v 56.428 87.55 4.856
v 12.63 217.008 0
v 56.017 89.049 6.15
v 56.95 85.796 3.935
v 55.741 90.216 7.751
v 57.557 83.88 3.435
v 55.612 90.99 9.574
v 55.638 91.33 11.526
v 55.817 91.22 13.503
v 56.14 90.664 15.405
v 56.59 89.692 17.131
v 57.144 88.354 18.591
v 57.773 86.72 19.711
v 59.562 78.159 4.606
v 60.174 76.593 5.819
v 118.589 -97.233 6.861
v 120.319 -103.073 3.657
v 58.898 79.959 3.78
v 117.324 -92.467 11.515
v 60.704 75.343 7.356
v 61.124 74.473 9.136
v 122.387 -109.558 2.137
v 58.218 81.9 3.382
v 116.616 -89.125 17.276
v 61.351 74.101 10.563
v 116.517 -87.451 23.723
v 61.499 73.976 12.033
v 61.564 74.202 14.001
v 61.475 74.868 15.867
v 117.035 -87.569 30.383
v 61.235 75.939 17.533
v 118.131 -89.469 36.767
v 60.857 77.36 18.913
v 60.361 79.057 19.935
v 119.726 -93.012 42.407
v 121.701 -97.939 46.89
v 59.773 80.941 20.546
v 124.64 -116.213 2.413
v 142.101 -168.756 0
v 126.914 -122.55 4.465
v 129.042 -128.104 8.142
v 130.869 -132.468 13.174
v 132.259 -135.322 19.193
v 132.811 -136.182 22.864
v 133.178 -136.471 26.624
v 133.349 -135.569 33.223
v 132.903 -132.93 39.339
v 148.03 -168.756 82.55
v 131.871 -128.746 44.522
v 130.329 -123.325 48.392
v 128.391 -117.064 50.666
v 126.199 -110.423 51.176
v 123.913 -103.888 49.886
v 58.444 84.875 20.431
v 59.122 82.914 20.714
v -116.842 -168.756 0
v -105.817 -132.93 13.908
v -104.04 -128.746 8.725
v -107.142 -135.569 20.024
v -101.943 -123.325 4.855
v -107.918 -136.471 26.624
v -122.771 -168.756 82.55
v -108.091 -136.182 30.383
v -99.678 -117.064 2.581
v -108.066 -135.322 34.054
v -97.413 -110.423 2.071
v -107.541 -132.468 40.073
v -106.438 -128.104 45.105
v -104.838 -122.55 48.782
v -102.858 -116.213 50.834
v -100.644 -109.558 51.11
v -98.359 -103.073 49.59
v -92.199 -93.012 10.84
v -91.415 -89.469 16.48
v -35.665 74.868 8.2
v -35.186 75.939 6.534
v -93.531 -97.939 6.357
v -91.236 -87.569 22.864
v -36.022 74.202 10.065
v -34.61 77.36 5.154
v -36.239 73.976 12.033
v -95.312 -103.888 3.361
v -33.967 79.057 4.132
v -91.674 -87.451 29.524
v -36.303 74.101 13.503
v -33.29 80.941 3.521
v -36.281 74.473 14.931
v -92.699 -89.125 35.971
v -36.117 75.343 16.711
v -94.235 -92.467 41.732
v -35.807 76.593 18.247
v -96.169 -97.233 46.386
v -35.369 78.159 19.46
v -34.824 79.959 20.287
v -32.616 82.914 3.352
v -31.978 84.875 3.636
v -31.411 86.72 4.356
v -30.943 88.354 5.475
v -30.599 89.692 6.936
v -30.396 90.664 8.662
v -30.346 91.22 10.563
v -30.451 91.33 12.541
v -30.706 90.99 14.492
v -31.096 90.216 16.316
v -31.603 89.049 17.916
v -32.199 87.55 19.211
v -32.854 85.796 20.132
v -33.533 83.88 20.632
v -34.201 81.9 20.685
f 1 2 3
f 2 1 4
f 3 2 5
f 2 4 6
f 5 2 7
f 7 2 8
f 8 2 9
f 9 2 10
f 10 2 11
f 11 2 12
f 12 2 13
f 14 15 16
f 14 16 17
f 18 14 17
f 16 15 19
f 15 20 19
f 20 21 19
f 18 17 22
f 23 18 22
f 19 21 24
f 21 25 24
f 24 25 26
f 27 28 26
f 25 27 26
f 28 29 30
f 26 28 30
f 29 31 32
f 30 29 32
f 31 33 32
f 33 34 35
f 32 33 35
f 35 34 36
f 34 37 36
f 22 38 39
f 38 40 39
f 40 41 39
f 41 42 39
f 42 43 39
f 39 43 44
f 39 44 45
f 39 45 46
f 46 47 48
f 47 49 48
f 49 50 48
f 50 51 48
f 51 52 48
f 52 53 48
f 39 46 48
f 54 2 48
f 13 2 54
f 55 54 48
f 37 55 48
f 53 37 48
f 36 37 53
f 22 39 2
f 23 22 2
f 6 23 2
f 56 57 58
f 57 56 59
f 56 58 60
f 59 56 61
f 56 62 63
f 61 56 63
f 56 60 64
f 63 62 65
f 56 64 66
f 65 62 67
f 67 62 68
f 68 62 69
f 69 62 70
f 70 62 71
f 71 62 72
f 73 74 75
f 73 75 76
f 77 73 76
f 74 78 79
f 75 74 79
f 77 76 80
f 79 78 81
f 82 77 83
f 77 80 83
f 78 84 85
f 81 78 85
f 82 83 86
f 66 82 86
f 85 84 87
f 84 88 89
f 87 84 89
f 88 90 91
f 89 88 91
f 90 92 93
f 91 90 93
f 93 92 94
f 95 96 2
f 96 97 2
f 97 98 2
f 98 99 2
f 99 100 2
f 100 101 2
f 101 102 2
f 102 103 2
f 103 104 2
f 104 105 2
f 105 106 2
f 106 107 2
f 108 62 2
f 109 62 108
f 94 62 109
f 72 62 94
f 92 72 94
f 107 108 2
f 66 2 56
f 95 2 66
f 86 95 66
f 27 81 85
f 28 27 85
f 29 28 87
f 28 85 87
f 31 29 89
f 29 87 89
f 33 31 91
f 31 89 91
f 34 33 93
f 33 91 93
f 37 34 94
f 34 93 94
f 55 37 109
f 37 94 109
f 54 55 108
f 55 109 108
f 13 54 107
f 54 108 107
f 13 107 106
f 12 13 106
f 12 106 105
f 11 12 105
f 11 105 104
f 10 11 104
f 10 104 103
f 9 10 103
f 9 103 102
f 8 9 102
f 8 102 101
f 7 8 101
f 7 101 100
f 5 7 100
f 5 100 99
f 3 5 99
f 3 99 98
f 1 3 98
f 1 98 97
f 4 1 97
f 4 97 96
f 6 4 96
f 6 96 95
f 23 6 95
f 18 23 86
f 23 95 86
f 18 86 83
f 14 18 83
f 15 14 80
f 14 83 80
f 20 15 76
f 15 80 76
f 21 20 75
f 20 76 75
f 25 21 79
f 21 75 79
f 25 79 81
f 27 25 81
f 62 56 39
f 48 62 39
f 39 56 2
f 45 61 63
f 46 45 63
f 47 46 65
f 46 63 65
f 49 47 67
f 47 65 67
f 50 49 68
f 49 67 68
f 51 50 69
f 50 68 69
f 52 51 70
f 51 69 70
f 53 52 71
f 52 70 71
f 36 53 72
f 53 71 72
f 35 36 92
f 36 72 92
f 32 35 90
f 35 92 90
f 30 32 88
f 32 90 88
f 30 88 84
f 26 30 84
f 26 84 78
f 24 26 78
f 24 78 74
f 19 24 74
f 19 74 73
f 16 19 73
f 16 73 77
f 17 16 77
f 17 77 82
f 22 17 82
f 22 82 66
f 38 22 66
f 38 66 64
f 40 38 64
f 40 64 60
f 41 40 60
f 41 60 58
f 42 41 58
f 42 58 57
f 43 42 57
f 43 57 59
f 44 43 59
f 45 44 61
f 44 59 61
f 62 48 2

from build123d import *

# Parameters (mm, degrees)
F0_W     = 270.8007246256
F0_H     = 385.7633024454
F1_DEPTH = 82.55
F3_DEPTH = 508
F5_R     = 8.6846383289
F5_R_2   = 24.5957658021
F6_DEPTH = 381
F7_DEPTH = 1016


with BuildPart() as f1:
    # F0 (on Top) → F1 (new body)
    with BuildSketch(Plane.XY):
        with Locations((12.6297399402, 24.1259709001)):
            Rectangle(F0_W, F0_H)
    extrude(amount=F1_DEPTH)

    # F2 (on face) → F3 (cut)
    with BuildSketch(Plane.YZ.offset(148.030102253)):
        Polygon((217.0076221228, 82.55), (-168.7556803226, 82.55), (217.0076221228, 0), align=None)
    extrude(amount=-F3_DEPTH, mode=Mode.SUBTRACT)

    # F5 (on face) → F6 (cut)
    with BuildSketch(Plane(origin=(-122.7706223726, 0, 0), x_dir=(0, -1, 0), z_dir=(-1, 0, 0))):
        with Locations((-82.6604217291, 12.0333293453)):
            Circle(F5_R)
        with Locations((111.8754446507, 26.6235191375)):
            Circle(F5_R_2)
    extrude(amount=-F6_DEPTH, mode=Mode.SUBTRACT)

    # F4 (on face) → F7 (cut)
    with BuildSketch(Plane(origin=(0, 9.5021501125, 44.4043707783), x_dir=(1, 0, 0), z_dir=(0, 0.2092538463, 0.9778613541))):
        Polygon((148.030102253, 212.2033672174), (12.6297399402, 212.2033672174), (148.030102253, -182.2935630794), align=None)
        Polygon((-122.7706223726, -182.2935630794), (12.6297399402, 212.2033672174), (-122.7706223726, 212.2033672174), align=None)
    extrude(amount=-F7_DEPTH, mode=Mode.SUBTRACT)


solid = f1.part
